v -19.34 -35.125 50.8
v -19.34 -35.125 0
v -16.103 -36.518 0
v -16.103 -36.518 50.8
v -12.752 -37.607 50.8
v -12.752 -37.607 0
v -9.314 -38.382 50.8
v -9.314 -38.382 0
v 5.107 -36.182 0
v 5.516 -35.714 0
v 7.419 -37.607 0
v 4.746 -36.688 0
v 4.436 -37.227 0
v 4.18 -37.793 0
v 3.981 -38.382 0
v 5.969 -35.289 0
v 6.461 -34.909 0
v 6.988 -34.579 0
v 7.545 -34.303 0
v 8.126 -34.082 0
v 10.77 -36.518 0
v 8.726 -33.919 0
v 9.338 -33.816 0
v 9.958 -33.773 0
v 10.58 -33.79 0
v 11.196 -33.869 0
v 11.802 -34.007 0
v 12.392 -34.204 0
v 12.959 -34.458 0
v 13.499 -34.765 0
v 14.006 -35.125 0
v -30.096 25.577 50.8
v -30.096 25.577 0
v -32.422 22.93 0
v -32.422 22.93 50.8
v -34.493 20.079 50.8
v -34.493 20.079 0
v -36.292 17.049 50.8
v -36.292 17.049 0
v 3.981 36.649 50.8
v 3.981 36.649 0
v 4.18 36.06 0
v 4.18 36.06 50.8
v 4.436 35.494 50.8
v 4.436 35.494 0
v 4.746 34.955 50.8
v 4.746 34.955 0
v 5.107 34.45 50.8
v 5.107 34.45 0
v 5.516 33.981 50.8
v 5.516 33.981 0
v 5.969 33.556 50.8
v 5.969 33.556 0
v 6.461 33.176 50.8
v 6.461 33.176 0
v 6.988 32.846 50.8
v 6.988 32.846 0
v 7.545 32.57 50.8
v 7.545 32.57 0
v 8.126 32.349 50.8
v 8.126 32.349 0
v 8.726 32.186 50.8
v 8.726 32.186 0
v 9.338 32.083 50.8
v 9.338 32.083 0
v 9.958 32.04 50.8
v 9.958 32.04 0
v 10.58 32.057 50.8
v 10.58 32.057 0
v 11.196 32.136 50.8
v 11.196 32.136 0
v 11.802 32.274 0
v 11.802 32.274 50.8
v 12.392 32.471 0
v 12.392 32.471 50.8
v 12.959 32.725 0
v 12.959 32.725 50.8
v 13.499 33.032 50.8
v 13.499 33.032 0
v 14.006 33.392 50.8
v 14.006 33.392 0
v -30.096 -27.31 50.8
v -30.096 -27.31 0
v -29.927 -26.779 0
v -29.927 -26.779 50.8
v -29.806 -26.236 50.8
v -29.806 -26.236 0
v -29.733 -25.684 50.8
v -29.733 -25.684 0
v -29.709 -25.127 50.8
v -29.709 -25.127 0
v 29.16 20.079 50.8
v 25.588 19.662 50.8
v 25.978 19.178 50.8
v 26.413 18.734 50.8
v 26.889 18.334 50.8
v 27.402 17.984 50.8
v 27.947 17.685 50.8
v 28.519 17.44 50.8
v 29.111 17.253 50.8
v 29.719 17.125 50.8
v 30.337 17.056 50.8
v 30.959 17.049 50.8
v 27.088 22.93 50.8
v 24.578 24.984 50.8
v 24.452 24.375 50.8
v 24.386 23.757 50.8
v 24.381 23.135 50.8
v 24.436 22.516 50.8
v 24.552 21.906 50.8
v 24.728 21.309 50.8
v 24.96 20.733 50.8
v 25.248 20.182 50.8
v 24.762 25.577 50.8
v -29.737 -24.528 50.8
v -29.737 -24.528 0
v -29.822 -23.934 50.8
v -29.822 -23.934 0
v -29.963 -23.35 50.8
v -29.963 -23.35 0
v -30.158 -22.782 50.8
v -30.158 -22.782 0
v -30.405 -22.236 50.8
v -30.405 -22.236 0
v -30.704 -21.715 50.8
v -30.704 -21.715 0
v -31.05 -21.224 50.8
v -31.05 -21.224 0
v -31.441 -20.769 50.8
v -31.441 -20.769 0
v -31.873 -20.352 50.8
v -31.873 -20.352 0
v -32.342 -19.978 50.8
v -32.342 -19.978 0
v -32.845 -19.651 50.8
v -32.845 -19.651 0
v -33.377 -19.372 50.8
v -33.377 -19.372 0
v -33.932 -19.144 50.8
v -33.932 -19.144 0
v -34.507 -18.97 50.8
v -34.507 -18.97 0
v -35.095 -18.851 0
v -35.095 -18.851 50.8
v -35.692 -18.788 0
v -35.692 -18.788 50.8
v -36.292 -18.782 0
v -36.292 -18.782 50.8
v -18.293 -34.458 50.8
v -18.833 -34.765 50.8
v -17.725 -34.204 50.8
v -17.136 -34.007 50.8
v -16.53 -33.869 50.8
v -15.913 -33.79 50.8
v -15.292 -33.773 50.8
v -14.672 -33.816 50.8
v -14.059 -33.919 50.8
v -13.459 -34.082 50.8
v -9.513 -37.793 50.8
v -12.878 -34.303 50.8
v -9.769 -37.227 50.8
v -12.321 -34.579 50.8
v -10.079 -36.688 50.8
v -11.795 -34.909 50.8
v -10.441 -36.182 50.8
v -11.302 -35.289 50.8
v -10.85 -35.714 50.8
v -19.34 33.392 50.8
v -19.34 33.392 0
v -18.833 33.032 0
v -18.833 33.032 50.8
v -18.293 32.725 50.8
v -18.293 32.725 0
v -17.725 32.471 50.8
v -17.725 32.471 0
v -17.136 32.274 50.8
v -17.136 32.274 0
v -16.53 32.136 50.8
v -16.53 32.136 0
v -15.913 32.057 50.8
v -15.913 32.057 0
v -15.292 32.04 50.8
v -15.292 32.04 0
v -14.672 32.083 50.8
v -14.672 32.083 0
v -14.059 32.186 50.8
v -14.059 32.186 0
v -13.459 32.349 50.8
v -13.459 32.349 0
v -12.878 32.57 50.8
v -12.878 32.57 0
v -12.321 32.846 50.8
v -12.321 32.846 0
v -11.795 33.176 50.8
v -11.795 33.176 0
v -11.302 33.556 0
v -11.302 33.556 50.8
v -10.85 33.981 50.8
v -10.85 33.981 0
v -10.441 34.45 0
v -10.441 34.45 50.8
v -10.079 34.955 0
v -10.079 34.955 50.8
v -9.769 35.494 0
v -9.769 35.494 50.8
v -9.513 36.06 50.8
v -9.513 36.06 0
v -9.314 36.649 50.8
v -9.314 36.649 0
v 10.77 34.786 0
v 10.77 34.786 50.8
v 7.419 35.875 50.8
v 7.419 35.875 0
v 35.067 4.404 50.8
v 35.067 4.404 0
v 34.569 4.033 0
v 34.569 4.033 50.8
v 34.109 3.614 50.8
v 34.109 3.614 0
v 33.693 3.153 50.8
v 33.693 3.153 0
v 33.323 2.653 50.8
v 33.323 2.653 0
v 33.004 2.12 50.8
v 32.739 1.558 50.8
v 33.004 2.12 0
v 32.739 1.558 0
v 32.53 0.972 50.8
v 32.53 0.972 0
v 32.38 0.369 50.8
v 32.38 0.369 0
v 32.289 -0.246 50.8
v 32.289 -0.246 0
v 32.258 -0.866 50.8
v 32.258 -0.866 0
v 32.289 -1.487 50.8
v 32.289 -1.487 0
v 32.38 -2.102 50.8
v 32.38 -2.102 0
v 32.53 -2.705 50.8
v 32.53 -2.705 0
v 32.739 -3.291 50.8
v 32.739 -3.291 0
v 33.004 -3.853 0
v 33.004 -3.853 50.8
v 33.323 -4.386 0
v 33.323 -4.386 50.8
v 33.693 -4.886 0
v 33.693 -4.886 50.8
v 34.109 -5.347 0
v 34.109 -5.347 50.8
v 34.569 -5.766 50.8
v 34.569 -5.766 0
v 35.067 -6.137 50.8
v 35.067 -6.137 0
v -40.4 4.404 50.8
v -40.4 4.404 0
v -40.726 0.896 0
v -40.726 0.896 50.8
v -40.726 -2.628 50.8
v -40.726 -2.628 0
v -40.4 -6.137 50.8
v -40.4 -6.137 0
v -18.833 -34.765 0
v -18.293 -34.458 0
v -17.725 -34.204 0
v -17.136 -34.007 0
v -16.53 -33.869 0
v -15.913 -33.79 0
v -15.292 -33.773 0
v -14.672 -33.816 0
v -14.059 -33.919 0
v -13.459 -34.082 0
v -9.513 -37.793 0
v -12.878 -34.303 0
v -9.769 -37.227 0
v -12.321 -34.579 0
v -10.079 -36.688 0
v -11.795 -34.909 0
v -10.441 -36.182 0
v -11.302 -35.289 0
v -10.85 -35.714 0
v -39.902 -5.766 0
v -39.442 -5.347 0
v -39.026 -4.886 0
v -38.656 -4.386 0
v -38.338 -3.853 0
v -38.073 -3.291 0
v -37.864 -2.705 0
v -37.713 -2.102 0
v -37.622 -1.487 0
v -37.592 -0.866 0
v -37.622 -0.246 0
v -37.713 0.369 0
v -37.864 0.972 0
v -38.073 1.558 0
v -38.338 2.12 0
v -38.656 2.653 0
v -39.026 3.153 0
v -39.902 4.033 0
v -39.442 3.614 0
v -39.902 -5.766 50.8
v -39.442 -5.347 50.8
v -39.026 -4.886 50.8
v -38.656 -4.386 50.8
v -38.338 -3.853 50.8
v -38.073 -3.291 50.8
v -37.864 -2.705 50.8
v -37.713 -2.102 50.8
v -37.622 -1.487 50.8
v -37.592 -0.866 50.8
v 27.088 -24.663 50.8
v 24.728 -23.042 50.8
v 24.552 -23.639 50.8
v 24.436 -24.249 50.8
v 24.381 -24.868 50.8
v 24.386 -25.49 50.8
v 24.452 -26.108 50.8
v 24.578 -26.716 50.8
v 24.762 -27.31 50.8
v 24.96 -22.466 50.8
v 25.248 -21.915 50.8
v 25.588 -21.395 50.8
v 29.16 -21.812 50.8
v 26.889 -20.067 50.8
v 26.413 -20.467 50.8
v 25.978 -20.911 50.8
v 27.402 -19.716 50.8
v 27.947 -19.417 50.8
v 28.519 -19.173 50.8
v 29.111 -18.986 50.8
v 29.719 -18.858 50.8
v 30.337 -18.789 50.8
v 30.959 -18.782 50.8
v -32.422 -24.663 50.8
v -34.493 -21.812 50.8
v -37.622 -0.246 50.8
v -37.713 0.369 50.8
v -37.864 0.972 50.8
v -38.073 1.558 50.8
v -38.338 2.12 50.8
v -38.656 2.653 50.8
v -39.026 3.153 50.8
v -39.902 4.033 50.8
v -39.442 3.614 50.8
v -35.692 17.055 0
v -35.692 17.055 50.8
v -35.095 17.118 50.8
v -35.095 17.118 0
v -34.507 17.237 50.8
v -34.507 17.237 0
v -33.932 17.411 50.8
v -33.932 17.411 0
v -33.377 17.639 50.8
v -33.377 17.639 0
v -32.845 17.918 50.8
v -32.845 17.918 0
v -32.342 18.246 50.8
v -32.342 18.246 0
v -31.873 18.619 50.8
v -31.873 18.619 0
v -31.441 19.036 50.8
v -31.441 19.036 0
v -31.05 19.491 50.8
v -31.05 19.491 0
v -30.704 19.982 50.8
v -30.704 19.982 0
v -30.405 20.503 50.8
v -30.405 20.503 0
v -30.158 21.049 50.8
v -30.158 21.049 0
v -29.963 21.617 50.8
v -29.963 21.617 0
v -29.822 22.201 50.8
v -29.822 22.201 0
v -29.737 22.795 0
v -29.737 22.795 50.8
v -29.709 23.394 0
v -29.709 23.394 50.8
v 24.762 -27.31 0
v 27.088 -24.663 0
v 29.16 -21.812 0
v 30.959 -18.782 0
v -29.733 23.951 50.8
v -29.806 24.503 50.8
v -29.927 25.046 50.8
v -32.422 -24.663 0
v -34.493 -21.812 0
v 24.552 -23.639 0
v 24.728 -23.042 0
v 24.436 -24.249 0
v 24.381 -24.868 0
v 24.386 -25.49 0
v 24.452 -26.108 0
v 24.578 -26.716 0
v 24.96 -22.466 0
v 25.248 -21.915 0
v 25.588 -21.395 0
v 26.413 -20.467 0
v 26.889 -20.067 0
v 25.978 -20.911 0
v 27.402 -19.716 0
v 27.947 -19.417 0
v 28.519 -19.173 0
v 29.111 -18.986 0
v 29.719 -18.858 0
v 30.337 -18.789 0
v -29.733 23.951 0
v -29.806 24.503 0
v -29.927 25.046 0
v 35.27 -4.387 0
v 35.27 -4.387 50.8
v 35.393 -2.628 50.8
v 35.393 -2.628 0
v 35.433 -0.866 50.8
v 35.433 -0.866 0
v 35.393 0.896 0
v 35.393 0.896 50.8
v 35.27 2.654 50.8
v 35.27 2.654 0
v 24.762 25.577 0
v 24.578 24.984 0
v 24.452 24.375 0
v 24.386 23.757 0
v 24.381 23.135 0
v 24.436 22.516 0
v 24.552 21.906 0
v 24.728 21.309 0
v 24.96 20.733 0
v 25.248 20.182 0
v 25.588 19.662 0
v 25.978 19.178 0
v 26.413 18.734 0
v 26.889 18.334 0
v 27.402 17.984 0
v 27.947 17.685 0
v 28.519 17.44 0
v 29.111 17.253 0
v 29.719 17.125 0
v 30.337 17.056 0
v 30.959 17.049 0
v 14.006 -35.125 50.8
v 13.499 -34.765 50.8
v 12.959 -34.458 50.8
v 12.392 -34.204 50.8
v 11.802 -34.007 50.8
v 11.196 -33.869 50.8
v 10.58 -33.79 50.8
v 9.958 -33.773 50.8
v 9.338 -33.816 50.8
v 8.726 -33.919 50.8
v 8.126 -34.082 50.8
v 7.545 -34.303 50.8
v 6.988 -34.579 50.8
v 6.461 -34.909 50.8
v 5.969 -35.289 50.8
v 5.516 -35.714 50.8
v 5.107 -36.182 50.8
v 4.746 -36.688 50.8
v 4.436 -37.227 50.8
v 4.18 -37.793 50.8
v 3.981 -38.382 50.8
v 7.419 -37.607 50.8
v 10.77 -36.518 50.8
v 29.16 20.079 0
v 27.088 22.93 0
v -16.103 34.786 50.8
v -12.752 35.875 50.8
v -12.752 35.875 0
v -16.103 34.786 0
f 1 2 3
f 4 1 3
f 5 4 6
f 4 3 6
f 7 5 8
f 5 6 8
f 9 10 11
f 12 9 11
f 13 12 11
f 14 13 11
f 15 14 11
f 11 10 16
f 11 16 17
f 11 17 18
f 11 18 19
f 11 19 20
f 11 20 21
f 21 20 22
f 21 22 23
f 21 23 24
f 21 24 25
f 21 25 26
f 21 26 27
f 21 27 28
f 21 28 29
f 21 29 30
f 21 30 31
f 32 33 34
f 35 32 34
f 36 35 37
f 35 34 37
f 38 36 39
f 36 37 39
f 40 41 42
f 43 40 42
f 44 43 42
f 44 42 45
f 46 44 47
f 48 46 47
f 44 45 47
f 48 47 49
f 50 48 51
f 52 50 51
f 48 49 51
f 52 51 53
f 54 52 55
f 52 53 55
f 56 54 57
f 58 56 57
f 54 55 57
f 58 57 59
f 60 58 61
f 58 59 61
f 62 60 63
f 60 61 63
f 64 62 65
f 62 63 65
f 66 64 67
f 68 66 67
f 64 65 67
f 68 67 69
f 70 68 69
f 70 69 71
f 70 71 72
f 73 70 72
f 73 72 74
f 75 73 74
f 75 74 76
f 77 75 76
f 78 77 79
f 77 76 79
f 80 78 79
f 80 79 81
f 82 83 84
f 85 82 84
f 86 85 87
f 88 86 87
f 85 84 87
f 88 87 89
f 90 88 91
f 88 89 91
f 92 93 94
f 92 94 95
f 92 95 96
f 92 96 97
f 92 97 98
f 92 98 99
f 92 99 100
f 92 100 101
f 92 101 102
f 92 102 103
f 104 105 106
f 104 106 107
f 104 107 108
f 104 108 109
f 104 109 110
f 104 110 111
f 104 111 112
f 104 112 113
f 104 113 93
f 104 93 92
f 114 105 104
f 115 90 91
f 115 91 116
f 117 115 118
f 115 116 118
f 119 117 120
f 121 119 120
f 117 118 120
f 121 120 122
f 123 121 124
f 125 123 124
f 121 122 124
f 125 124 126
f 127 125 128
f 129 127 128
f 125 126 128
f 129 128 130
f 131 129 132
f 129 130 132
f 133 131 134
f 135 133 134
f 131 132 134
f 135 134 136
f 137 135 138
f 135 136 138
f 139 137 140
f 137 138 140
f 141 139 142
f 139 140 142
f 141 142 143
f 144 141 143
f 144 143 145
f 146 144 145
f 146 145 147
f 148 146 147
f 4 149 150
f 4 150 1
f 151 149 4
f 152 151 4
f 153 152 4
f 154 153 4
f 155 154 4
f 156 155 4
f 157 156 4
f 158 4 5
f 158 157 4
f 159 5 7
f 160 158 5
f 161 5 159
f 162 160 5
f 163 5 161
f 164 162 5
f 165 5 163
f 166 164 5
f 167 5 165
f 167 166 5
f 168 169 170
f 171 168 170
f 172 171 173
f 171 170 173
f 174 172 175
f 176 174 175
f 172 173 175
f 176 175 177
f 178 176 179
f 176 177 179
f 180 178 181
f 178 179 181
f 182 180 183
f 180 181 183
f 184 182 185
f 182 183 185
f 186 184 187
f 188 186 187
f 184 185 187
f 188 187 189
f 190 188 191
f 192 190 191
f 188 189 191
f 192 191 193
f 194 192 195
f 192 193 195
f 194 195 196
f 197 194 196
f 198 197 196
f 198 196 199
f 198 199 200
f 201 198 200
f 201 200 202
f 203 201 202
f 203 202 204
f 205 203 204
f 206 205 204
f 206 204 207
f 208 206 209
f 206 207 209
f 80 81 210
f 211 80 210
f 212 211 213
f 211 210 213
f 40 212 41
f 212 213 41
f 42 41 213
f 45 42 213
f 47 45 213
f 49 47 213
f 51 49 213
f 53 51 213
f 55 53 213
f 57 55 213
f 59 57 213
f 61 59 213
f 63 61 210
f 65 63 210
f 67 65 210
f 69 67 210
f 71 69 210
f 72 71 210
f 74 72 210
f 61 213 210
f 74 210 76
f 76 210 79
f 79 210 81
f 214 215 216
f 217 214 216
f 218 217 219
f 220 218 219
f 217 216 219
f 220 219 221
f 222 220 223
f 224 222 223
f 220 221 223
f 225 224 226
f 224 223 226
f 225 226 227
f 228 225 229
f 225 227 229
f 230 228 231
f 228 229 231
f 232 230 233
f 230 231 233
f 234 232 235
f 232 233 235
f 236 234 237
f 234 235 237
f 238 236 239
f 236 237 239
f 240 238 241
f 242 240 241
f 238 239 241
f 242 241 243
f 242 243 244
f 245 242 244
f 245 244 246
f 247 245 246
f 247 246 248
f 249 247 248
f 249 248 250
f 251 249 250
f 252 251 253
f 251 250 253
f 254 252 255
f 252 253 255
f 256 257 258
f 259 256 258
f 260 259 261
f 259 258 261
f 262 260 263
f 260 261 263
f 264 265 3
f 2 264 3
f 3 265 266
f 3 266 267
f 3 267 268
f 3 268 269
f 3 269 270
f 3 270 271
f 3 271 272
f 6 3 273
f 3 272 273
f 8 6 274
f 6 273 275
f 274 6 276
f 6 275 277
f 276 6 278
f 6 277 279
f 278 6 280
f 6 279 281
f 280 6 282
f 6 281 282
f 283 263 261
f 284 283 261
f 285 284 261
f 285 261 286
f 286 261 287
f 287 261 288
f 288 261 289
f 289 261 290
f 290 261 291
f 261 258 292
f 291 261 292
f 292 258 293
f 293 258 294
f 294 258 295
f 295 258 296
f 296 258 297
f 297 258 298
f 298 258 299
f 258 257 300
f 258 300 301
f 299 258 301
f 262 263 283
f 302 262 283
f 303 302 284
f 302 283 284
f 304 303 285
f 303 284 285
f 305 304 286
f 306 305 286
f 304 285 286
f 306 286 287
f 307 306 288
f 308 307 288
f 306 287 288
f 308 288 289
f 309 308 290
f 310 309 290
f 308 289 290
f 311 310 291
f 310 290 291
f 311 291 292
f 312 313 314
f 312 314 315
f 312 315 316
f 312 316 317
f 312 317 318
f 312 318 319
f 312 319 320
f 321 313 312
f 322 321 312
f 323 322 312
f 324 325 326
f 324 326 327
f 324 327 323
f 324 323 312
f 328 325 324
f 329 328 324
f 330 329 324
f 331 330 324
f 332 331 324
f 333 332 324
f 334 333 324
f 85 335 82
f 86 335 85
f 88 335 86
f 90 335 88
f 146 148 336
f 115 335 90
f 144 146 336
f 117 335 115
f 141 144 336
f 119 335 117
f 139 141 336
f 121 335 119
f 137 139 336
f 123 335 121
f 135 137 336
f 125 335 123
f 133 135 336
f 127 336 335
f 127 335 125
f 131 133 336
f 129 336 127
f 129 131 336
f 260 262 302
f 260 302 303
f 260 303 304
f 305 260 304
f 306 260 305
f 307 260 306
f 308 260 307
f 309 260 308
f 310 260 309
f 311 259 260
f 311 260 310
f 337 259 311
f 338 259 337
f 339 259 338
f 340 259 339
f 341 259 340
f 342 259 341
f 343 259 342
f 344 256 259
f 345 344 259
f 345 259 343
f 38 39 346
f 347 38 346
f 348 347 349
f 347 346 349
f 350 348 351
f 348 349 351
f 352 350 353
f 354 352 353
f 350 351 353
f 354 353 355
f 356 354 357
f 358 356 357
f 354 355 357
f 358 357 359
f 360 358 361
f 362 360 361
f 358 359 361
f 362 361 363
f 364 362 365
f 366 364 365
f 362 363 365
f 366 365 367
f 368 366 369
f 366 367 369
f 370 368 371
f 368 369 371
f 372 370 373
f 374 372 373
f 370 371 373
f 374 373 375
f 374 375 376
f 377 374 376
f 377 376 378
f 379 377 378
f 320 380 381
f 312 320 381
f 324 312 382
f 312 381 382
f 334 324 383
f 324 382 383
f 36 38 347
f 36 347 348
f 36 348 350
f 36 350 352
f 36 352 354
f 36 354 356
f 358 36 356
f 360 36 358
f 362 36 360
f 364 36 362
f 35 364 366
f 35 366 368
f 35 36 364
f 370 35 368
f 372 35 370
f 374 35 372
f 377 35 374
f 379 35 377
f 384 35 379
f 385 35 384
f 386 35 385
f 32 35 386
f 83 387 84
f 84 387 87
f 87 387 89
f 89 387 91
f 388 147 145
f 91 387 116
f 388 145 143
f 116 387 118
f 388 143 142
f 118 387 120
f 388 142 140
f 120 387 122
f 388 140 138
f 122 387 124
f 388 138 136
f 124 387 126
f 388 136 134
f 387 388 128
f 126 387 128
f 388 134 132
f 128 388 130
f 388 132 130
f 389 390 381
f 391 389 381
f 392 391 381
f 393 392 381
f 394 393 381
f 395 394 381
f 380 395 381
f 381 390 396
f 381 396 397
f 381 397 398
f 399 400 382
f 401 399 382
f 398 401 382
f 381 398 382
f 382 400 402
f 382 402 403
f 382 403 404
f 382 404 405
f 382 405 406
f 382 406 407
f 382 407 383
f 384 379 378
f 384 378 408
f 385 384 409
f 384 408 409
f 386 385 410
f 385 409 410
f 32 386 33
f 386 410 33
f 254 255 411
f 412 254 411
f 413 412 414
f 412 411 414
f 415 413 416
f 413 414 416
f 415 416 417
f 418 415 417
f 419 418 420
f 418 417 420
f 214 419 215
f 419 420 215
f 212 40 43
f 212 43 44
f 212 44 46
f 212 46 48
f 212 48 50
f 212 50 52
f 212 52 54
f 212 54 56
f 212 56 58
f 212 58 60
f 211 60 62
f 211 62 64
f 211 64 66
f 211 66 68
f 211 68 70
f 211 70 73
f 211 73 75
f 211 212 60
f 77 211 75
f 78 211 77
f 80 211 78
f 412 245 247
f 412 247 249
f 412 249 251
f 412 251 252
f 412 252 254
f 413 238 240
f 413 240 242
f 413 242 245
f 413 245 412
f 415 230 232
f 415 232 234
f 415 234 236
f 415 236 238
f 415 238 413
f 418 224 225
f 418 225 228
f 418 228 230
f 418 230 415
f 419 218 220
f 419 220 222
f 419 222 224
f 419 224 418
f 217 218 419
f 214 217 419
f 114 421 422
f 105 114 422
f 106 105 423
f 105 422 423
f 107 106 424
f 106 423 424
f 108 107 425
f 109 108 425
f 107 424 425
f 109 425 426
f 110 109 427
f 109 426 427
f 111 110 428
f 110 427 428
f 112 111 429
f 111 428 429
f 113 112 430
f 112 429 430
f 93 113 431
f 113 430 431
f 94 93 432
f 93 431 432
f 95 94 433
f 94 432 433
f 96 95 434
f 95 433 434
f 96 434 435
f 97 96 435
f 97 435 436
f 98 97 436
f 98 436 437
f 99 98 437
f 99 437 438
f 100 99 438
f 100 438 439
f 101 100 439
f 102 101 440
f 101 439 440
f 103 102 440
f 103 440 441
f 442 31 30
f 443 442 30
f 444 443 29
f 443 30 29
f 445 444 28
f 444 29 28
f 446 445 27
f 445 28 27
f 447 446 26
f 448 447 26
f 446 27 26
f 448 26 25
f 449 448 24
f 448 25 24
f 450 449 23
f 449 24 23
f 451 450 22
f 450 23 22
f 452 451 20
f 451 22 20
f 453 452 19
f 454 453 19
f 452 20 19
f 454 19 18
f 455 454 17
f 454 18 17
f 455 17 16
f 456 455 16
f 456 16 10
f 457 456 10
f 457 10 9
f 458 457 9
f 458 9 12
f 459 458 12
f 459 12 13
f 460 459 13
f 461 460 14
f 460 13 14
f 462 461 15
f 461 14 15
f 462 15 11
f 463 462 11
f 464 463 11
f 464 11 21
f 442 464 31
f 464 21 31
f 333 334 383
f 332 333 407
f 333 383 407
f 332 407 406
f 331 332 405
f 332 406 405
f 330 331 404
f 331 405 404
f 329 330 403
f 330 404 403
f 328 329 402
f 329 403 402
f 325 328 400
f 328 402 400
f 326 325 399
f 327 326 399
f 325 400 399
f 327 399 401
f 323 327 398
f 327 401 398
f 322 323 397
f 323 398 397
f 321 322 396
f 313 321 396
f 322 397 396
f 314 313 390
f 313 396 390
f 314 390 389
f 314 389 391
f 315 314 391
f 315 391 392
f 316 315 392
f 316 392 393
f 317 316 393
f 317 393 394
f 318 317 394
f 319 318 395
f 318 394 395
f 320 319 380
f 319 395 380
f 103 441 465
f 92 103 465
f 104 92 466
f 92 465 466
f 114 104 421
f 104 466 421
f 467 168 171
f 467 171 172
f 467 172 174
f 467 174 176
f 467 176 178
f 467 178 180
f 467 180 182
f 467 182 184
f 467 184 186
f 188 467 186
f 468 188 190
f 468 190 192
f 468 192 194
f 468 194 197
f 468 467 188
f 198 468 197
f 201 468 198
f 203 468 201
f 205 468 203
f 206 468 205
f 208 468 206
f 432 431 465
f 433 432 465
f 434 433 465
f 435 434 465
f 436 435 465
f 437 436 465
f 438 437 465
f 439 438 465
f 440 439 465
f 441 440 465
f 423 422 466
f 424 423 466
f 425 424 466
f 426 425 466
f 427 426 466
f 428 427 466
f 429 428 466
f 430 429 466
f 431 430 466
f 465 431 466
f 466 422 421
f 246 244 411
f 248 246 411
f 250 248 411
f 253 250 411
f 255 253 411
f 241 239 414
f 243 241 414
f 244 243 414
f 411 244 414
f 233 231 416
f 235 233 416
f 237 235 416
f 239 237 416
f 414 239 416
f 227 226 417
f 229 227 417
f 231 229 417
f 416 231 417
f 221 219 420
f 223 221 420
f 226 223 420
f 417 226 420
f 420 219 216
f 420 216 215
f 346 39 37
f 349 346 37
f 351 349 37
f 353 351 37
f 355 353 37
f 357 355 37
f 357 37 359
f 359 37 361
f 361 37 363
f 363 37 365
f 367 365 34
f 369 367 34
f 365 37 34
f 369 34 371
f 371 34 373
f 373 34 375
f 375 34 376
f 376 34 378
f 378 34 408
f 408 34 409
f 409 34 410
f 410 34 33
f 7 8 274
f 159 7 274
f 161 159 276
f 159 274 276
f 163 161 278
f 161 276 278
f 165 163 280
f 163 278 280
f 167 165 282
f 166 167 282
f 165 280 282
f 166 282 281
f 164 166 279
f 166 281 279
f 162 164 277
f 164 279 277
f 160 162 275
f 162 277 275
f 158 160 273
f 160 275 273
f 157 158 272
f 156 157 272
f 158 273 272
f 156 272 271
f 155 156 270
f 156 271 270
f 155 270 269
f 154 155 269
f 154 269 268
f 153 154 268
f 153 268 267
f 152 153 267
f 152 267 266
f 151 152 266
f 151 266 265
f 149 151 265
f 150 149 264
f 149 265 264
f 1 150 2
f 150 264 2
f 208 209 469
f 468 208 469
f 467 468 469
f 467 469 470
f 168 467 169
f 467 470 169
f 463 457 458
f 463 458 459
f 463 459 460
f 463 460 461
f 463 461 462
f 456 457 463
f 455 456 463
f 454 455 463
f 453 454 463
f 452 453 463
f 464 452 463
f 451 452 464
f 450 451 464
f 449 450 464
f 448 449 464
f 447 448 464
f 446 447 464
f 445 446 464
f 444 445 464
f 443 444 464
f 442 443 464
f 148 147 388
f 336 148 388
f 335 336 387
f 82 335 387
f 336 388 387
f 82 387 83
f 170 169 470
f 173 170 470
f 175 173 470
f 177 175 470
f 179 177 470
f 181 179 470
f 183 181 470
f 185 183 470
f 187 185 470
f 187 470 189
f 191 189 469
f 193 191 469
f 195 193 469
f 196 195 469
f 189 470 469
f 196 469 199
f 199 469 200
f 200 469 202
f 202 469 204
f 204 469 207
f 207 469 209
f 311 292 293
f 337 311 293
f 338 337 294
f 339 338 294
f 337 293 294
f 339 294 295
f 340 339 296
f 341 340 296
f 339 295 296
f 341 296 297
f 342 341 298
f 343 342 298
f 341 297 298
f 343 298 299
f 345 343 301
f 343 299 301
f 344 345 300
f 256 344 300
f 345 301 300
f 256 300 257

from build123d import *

# Parameters (mm, degrees)
F1_DEPTH = 50.8


with BuildPart() as f1:
    # F0 (on Top) → F1 (new body)
    with BuildSketch(Plane.XY):
        with BuildLine():
            ThreePointArc((-19.3398569951, 33.3916111417), (-13.4591034015, 32.3491903927), (-9.3141933475, 36.6491467286))
            ThreePointArc((-9.3141933475, 36.6491467286), (-14.4402323586, 35.368794832), (-19.3398569951, 33.3916111417))
        make_face()
    extrude(amount=F1_DEPTH)


with BuildPart() as f1b:
    # F0 (on Top) → F1, piece 2 (new body)
    with BuildSketch(Plane.XY):
        with BuildLine():
            ThreePointArc((-29.7088613158, 23.3943778495), (-29.8063319718, 24.5026994647), (-30.0957516474, 25.5769962501))
            ThreePointArc((-30.0957516474, 25.5769962501), (-33.4902323586, 21.5281596735), (-36.2919525414, 17.048657364))
            ThreePointArc((-36.2919525414, 17.048657364), (-31.6519139189, 18.8225822896), (-29.7088613158, 23.3943778495))
        make_face()
    extrude(amount=F1_DEPTH)


with BuildPart() as f1c:
    # F0 (on Top) → F1, piece 3 (new body)
    with BuildSketch(Plane.XY):
        with BuildLine():
            ThreePointArc((-37.591684873, -0.8664584389), (-38.3376663114, 2.1197558806), (-40.4003387191, 4.4043448603))
            ThreePointArc((-40.4003387191, 4.4043448603), (-40.766684873, -0.8664584389), (-40.4003387191, -6.1372617381))
            ThreePointArc((-40.4003387191, -6.1372617381), (-38.3376663114, -3.8526727583), (-37.591684873, -0.8664584389))
        make_face()
    extrude(amount=F1_DEPTH)


with BuildPart() as f1d:
    # F0 (on Top) → F1, piece 4 (new body)
    with BuildSketch(Plane.XY):
        with BuildLine():
            ThreePointArc((3.9808236016, 36.6491467286), (8.1257336556, 32.3491903927), (14.0064872492, 33.3916111417))
            ThreePointArc((14.0064872492, 33.3916111417), (9.1068626127, 35.368794832), (3.9808236016, 36.6491467286))
        make_face()
    extrude(amount=F1_DEPTH)


with BuildPart() as f1e:
    # F0 (on Top) → F1, piece 5 (new body)
    with BuildSketch(Plane.XY):
        with BuildLine():
            ThreePointArc((24.7623819015, 25.5769962501), (25.5882336556, 19.6619414974), (30.9585827954, 17.048657364))
            ThreePointArc((30.9585827954, 17.048657364), (28.1568626127, 21.5281596735), (24.7623819014, 25.5769962501))
        make_face()
    extrude(amount=F1_DEPTH)


with BuildPart() as f1f:
    # F0 (on Top) → F1, piece 6 (new body)
    with BuildSketch(Plane.XY):
        with BuildLine():
            ThreePointArc((35.0669689732, -6.1372617381), (35.3416182432, -3.5082181234), (35.433315127, -0.8664584389))
            ThreePointArc((35.433315127, -0.8664584389), (35.3416182432, 1.7753012457), (35.0669689732, 4.4043448603))
            ThreePointArc((35.0669689732, 4.4043448603), (32.258315127, -0.8664584389), (35.0669689732, -6.1372617381))
        make_face()
    extrude(amount=F1_DEPTH)


with BuildPart() as f1g:
    # F0 (on Top) → F1, piece 7 (new body)
    with BuildSketch(Plane.XY):
        with BuildLine():
            ThreePointArc((24.7623819014, -27.3099131278), (28.1568626127, -23.2610765512), (30.9585827954, -18.7815742417))
            ThreePointArc((30.9585827954, -18.7815742417), (25.5882336556, -21.3948583752), (24.7623819015, -27.3099131278))
        make_face()
    extrude(amount=F1_DEPTH)


with BuildPart() as f1h:
    # F0 (on Top) → F1, piece 8 (new body)
    with BuildSketch(Plane.XY):
        with BuildLine():
            ThreePointArc((3.9808236016, -38.3820636063), (9.1068626127, -37.1017117097), (14.0064872492, -35.1245280194))
            ThreePointArc((14.0064872492, -35.1245280194), (8.1257336556, -34.0821072705), (3.9808236016, -38.3820636063))
        make_face()
    extrude(amount=F1_DEPTH)


with BuildPart() as f1i:
    # F0 (on Top) → F1, piece 9 (new body)
    with BuildSketch(Plane.XY):
        with BuildLine():
            ThreePointArc((-19.3398569951, -35.1245280194), (-14.4402323586, -37.1017117097), (-9.3141933475, -38.3820636063))
            ThreePointArc((-9.3141933475, -38.3820636063), (-13.4591034015, -34.0821072705), (-19.3398569951, -35.1245280194))
        make_face()
    extrude(amount=F1_DEPTH)


with BuildPart() as f1j:
    # F0 (on Top) → F1, piece 10 (new body)
    with BuildSketch(Plane.XY):
        with BuildLine():
            ThreePointArc((-36.2919525414, -18.7815742417), (-33.4902323586, -23.2610765512), (-30.0957516474, -27.3099131278))
            ThreePointArc((-30.0957516474, -27.3099131278), (-29.8063319718, -26.2356163425), (-29.7088613158, -25.1272947272))
            ThreePointArc((-29.7088613158, -25.1272947272), (-31.6519139189, -20.5554991674), (-36.2919525414, -18.7815742417))
        make_face()
    extrude(amount=F1_DEPTH)


solid = Compound([f1.part, f1b.part, f1c.part, f1d.part, f1e.part, f1f.part, f1g.part, f1h.part, f1i.part, f1j.part])
